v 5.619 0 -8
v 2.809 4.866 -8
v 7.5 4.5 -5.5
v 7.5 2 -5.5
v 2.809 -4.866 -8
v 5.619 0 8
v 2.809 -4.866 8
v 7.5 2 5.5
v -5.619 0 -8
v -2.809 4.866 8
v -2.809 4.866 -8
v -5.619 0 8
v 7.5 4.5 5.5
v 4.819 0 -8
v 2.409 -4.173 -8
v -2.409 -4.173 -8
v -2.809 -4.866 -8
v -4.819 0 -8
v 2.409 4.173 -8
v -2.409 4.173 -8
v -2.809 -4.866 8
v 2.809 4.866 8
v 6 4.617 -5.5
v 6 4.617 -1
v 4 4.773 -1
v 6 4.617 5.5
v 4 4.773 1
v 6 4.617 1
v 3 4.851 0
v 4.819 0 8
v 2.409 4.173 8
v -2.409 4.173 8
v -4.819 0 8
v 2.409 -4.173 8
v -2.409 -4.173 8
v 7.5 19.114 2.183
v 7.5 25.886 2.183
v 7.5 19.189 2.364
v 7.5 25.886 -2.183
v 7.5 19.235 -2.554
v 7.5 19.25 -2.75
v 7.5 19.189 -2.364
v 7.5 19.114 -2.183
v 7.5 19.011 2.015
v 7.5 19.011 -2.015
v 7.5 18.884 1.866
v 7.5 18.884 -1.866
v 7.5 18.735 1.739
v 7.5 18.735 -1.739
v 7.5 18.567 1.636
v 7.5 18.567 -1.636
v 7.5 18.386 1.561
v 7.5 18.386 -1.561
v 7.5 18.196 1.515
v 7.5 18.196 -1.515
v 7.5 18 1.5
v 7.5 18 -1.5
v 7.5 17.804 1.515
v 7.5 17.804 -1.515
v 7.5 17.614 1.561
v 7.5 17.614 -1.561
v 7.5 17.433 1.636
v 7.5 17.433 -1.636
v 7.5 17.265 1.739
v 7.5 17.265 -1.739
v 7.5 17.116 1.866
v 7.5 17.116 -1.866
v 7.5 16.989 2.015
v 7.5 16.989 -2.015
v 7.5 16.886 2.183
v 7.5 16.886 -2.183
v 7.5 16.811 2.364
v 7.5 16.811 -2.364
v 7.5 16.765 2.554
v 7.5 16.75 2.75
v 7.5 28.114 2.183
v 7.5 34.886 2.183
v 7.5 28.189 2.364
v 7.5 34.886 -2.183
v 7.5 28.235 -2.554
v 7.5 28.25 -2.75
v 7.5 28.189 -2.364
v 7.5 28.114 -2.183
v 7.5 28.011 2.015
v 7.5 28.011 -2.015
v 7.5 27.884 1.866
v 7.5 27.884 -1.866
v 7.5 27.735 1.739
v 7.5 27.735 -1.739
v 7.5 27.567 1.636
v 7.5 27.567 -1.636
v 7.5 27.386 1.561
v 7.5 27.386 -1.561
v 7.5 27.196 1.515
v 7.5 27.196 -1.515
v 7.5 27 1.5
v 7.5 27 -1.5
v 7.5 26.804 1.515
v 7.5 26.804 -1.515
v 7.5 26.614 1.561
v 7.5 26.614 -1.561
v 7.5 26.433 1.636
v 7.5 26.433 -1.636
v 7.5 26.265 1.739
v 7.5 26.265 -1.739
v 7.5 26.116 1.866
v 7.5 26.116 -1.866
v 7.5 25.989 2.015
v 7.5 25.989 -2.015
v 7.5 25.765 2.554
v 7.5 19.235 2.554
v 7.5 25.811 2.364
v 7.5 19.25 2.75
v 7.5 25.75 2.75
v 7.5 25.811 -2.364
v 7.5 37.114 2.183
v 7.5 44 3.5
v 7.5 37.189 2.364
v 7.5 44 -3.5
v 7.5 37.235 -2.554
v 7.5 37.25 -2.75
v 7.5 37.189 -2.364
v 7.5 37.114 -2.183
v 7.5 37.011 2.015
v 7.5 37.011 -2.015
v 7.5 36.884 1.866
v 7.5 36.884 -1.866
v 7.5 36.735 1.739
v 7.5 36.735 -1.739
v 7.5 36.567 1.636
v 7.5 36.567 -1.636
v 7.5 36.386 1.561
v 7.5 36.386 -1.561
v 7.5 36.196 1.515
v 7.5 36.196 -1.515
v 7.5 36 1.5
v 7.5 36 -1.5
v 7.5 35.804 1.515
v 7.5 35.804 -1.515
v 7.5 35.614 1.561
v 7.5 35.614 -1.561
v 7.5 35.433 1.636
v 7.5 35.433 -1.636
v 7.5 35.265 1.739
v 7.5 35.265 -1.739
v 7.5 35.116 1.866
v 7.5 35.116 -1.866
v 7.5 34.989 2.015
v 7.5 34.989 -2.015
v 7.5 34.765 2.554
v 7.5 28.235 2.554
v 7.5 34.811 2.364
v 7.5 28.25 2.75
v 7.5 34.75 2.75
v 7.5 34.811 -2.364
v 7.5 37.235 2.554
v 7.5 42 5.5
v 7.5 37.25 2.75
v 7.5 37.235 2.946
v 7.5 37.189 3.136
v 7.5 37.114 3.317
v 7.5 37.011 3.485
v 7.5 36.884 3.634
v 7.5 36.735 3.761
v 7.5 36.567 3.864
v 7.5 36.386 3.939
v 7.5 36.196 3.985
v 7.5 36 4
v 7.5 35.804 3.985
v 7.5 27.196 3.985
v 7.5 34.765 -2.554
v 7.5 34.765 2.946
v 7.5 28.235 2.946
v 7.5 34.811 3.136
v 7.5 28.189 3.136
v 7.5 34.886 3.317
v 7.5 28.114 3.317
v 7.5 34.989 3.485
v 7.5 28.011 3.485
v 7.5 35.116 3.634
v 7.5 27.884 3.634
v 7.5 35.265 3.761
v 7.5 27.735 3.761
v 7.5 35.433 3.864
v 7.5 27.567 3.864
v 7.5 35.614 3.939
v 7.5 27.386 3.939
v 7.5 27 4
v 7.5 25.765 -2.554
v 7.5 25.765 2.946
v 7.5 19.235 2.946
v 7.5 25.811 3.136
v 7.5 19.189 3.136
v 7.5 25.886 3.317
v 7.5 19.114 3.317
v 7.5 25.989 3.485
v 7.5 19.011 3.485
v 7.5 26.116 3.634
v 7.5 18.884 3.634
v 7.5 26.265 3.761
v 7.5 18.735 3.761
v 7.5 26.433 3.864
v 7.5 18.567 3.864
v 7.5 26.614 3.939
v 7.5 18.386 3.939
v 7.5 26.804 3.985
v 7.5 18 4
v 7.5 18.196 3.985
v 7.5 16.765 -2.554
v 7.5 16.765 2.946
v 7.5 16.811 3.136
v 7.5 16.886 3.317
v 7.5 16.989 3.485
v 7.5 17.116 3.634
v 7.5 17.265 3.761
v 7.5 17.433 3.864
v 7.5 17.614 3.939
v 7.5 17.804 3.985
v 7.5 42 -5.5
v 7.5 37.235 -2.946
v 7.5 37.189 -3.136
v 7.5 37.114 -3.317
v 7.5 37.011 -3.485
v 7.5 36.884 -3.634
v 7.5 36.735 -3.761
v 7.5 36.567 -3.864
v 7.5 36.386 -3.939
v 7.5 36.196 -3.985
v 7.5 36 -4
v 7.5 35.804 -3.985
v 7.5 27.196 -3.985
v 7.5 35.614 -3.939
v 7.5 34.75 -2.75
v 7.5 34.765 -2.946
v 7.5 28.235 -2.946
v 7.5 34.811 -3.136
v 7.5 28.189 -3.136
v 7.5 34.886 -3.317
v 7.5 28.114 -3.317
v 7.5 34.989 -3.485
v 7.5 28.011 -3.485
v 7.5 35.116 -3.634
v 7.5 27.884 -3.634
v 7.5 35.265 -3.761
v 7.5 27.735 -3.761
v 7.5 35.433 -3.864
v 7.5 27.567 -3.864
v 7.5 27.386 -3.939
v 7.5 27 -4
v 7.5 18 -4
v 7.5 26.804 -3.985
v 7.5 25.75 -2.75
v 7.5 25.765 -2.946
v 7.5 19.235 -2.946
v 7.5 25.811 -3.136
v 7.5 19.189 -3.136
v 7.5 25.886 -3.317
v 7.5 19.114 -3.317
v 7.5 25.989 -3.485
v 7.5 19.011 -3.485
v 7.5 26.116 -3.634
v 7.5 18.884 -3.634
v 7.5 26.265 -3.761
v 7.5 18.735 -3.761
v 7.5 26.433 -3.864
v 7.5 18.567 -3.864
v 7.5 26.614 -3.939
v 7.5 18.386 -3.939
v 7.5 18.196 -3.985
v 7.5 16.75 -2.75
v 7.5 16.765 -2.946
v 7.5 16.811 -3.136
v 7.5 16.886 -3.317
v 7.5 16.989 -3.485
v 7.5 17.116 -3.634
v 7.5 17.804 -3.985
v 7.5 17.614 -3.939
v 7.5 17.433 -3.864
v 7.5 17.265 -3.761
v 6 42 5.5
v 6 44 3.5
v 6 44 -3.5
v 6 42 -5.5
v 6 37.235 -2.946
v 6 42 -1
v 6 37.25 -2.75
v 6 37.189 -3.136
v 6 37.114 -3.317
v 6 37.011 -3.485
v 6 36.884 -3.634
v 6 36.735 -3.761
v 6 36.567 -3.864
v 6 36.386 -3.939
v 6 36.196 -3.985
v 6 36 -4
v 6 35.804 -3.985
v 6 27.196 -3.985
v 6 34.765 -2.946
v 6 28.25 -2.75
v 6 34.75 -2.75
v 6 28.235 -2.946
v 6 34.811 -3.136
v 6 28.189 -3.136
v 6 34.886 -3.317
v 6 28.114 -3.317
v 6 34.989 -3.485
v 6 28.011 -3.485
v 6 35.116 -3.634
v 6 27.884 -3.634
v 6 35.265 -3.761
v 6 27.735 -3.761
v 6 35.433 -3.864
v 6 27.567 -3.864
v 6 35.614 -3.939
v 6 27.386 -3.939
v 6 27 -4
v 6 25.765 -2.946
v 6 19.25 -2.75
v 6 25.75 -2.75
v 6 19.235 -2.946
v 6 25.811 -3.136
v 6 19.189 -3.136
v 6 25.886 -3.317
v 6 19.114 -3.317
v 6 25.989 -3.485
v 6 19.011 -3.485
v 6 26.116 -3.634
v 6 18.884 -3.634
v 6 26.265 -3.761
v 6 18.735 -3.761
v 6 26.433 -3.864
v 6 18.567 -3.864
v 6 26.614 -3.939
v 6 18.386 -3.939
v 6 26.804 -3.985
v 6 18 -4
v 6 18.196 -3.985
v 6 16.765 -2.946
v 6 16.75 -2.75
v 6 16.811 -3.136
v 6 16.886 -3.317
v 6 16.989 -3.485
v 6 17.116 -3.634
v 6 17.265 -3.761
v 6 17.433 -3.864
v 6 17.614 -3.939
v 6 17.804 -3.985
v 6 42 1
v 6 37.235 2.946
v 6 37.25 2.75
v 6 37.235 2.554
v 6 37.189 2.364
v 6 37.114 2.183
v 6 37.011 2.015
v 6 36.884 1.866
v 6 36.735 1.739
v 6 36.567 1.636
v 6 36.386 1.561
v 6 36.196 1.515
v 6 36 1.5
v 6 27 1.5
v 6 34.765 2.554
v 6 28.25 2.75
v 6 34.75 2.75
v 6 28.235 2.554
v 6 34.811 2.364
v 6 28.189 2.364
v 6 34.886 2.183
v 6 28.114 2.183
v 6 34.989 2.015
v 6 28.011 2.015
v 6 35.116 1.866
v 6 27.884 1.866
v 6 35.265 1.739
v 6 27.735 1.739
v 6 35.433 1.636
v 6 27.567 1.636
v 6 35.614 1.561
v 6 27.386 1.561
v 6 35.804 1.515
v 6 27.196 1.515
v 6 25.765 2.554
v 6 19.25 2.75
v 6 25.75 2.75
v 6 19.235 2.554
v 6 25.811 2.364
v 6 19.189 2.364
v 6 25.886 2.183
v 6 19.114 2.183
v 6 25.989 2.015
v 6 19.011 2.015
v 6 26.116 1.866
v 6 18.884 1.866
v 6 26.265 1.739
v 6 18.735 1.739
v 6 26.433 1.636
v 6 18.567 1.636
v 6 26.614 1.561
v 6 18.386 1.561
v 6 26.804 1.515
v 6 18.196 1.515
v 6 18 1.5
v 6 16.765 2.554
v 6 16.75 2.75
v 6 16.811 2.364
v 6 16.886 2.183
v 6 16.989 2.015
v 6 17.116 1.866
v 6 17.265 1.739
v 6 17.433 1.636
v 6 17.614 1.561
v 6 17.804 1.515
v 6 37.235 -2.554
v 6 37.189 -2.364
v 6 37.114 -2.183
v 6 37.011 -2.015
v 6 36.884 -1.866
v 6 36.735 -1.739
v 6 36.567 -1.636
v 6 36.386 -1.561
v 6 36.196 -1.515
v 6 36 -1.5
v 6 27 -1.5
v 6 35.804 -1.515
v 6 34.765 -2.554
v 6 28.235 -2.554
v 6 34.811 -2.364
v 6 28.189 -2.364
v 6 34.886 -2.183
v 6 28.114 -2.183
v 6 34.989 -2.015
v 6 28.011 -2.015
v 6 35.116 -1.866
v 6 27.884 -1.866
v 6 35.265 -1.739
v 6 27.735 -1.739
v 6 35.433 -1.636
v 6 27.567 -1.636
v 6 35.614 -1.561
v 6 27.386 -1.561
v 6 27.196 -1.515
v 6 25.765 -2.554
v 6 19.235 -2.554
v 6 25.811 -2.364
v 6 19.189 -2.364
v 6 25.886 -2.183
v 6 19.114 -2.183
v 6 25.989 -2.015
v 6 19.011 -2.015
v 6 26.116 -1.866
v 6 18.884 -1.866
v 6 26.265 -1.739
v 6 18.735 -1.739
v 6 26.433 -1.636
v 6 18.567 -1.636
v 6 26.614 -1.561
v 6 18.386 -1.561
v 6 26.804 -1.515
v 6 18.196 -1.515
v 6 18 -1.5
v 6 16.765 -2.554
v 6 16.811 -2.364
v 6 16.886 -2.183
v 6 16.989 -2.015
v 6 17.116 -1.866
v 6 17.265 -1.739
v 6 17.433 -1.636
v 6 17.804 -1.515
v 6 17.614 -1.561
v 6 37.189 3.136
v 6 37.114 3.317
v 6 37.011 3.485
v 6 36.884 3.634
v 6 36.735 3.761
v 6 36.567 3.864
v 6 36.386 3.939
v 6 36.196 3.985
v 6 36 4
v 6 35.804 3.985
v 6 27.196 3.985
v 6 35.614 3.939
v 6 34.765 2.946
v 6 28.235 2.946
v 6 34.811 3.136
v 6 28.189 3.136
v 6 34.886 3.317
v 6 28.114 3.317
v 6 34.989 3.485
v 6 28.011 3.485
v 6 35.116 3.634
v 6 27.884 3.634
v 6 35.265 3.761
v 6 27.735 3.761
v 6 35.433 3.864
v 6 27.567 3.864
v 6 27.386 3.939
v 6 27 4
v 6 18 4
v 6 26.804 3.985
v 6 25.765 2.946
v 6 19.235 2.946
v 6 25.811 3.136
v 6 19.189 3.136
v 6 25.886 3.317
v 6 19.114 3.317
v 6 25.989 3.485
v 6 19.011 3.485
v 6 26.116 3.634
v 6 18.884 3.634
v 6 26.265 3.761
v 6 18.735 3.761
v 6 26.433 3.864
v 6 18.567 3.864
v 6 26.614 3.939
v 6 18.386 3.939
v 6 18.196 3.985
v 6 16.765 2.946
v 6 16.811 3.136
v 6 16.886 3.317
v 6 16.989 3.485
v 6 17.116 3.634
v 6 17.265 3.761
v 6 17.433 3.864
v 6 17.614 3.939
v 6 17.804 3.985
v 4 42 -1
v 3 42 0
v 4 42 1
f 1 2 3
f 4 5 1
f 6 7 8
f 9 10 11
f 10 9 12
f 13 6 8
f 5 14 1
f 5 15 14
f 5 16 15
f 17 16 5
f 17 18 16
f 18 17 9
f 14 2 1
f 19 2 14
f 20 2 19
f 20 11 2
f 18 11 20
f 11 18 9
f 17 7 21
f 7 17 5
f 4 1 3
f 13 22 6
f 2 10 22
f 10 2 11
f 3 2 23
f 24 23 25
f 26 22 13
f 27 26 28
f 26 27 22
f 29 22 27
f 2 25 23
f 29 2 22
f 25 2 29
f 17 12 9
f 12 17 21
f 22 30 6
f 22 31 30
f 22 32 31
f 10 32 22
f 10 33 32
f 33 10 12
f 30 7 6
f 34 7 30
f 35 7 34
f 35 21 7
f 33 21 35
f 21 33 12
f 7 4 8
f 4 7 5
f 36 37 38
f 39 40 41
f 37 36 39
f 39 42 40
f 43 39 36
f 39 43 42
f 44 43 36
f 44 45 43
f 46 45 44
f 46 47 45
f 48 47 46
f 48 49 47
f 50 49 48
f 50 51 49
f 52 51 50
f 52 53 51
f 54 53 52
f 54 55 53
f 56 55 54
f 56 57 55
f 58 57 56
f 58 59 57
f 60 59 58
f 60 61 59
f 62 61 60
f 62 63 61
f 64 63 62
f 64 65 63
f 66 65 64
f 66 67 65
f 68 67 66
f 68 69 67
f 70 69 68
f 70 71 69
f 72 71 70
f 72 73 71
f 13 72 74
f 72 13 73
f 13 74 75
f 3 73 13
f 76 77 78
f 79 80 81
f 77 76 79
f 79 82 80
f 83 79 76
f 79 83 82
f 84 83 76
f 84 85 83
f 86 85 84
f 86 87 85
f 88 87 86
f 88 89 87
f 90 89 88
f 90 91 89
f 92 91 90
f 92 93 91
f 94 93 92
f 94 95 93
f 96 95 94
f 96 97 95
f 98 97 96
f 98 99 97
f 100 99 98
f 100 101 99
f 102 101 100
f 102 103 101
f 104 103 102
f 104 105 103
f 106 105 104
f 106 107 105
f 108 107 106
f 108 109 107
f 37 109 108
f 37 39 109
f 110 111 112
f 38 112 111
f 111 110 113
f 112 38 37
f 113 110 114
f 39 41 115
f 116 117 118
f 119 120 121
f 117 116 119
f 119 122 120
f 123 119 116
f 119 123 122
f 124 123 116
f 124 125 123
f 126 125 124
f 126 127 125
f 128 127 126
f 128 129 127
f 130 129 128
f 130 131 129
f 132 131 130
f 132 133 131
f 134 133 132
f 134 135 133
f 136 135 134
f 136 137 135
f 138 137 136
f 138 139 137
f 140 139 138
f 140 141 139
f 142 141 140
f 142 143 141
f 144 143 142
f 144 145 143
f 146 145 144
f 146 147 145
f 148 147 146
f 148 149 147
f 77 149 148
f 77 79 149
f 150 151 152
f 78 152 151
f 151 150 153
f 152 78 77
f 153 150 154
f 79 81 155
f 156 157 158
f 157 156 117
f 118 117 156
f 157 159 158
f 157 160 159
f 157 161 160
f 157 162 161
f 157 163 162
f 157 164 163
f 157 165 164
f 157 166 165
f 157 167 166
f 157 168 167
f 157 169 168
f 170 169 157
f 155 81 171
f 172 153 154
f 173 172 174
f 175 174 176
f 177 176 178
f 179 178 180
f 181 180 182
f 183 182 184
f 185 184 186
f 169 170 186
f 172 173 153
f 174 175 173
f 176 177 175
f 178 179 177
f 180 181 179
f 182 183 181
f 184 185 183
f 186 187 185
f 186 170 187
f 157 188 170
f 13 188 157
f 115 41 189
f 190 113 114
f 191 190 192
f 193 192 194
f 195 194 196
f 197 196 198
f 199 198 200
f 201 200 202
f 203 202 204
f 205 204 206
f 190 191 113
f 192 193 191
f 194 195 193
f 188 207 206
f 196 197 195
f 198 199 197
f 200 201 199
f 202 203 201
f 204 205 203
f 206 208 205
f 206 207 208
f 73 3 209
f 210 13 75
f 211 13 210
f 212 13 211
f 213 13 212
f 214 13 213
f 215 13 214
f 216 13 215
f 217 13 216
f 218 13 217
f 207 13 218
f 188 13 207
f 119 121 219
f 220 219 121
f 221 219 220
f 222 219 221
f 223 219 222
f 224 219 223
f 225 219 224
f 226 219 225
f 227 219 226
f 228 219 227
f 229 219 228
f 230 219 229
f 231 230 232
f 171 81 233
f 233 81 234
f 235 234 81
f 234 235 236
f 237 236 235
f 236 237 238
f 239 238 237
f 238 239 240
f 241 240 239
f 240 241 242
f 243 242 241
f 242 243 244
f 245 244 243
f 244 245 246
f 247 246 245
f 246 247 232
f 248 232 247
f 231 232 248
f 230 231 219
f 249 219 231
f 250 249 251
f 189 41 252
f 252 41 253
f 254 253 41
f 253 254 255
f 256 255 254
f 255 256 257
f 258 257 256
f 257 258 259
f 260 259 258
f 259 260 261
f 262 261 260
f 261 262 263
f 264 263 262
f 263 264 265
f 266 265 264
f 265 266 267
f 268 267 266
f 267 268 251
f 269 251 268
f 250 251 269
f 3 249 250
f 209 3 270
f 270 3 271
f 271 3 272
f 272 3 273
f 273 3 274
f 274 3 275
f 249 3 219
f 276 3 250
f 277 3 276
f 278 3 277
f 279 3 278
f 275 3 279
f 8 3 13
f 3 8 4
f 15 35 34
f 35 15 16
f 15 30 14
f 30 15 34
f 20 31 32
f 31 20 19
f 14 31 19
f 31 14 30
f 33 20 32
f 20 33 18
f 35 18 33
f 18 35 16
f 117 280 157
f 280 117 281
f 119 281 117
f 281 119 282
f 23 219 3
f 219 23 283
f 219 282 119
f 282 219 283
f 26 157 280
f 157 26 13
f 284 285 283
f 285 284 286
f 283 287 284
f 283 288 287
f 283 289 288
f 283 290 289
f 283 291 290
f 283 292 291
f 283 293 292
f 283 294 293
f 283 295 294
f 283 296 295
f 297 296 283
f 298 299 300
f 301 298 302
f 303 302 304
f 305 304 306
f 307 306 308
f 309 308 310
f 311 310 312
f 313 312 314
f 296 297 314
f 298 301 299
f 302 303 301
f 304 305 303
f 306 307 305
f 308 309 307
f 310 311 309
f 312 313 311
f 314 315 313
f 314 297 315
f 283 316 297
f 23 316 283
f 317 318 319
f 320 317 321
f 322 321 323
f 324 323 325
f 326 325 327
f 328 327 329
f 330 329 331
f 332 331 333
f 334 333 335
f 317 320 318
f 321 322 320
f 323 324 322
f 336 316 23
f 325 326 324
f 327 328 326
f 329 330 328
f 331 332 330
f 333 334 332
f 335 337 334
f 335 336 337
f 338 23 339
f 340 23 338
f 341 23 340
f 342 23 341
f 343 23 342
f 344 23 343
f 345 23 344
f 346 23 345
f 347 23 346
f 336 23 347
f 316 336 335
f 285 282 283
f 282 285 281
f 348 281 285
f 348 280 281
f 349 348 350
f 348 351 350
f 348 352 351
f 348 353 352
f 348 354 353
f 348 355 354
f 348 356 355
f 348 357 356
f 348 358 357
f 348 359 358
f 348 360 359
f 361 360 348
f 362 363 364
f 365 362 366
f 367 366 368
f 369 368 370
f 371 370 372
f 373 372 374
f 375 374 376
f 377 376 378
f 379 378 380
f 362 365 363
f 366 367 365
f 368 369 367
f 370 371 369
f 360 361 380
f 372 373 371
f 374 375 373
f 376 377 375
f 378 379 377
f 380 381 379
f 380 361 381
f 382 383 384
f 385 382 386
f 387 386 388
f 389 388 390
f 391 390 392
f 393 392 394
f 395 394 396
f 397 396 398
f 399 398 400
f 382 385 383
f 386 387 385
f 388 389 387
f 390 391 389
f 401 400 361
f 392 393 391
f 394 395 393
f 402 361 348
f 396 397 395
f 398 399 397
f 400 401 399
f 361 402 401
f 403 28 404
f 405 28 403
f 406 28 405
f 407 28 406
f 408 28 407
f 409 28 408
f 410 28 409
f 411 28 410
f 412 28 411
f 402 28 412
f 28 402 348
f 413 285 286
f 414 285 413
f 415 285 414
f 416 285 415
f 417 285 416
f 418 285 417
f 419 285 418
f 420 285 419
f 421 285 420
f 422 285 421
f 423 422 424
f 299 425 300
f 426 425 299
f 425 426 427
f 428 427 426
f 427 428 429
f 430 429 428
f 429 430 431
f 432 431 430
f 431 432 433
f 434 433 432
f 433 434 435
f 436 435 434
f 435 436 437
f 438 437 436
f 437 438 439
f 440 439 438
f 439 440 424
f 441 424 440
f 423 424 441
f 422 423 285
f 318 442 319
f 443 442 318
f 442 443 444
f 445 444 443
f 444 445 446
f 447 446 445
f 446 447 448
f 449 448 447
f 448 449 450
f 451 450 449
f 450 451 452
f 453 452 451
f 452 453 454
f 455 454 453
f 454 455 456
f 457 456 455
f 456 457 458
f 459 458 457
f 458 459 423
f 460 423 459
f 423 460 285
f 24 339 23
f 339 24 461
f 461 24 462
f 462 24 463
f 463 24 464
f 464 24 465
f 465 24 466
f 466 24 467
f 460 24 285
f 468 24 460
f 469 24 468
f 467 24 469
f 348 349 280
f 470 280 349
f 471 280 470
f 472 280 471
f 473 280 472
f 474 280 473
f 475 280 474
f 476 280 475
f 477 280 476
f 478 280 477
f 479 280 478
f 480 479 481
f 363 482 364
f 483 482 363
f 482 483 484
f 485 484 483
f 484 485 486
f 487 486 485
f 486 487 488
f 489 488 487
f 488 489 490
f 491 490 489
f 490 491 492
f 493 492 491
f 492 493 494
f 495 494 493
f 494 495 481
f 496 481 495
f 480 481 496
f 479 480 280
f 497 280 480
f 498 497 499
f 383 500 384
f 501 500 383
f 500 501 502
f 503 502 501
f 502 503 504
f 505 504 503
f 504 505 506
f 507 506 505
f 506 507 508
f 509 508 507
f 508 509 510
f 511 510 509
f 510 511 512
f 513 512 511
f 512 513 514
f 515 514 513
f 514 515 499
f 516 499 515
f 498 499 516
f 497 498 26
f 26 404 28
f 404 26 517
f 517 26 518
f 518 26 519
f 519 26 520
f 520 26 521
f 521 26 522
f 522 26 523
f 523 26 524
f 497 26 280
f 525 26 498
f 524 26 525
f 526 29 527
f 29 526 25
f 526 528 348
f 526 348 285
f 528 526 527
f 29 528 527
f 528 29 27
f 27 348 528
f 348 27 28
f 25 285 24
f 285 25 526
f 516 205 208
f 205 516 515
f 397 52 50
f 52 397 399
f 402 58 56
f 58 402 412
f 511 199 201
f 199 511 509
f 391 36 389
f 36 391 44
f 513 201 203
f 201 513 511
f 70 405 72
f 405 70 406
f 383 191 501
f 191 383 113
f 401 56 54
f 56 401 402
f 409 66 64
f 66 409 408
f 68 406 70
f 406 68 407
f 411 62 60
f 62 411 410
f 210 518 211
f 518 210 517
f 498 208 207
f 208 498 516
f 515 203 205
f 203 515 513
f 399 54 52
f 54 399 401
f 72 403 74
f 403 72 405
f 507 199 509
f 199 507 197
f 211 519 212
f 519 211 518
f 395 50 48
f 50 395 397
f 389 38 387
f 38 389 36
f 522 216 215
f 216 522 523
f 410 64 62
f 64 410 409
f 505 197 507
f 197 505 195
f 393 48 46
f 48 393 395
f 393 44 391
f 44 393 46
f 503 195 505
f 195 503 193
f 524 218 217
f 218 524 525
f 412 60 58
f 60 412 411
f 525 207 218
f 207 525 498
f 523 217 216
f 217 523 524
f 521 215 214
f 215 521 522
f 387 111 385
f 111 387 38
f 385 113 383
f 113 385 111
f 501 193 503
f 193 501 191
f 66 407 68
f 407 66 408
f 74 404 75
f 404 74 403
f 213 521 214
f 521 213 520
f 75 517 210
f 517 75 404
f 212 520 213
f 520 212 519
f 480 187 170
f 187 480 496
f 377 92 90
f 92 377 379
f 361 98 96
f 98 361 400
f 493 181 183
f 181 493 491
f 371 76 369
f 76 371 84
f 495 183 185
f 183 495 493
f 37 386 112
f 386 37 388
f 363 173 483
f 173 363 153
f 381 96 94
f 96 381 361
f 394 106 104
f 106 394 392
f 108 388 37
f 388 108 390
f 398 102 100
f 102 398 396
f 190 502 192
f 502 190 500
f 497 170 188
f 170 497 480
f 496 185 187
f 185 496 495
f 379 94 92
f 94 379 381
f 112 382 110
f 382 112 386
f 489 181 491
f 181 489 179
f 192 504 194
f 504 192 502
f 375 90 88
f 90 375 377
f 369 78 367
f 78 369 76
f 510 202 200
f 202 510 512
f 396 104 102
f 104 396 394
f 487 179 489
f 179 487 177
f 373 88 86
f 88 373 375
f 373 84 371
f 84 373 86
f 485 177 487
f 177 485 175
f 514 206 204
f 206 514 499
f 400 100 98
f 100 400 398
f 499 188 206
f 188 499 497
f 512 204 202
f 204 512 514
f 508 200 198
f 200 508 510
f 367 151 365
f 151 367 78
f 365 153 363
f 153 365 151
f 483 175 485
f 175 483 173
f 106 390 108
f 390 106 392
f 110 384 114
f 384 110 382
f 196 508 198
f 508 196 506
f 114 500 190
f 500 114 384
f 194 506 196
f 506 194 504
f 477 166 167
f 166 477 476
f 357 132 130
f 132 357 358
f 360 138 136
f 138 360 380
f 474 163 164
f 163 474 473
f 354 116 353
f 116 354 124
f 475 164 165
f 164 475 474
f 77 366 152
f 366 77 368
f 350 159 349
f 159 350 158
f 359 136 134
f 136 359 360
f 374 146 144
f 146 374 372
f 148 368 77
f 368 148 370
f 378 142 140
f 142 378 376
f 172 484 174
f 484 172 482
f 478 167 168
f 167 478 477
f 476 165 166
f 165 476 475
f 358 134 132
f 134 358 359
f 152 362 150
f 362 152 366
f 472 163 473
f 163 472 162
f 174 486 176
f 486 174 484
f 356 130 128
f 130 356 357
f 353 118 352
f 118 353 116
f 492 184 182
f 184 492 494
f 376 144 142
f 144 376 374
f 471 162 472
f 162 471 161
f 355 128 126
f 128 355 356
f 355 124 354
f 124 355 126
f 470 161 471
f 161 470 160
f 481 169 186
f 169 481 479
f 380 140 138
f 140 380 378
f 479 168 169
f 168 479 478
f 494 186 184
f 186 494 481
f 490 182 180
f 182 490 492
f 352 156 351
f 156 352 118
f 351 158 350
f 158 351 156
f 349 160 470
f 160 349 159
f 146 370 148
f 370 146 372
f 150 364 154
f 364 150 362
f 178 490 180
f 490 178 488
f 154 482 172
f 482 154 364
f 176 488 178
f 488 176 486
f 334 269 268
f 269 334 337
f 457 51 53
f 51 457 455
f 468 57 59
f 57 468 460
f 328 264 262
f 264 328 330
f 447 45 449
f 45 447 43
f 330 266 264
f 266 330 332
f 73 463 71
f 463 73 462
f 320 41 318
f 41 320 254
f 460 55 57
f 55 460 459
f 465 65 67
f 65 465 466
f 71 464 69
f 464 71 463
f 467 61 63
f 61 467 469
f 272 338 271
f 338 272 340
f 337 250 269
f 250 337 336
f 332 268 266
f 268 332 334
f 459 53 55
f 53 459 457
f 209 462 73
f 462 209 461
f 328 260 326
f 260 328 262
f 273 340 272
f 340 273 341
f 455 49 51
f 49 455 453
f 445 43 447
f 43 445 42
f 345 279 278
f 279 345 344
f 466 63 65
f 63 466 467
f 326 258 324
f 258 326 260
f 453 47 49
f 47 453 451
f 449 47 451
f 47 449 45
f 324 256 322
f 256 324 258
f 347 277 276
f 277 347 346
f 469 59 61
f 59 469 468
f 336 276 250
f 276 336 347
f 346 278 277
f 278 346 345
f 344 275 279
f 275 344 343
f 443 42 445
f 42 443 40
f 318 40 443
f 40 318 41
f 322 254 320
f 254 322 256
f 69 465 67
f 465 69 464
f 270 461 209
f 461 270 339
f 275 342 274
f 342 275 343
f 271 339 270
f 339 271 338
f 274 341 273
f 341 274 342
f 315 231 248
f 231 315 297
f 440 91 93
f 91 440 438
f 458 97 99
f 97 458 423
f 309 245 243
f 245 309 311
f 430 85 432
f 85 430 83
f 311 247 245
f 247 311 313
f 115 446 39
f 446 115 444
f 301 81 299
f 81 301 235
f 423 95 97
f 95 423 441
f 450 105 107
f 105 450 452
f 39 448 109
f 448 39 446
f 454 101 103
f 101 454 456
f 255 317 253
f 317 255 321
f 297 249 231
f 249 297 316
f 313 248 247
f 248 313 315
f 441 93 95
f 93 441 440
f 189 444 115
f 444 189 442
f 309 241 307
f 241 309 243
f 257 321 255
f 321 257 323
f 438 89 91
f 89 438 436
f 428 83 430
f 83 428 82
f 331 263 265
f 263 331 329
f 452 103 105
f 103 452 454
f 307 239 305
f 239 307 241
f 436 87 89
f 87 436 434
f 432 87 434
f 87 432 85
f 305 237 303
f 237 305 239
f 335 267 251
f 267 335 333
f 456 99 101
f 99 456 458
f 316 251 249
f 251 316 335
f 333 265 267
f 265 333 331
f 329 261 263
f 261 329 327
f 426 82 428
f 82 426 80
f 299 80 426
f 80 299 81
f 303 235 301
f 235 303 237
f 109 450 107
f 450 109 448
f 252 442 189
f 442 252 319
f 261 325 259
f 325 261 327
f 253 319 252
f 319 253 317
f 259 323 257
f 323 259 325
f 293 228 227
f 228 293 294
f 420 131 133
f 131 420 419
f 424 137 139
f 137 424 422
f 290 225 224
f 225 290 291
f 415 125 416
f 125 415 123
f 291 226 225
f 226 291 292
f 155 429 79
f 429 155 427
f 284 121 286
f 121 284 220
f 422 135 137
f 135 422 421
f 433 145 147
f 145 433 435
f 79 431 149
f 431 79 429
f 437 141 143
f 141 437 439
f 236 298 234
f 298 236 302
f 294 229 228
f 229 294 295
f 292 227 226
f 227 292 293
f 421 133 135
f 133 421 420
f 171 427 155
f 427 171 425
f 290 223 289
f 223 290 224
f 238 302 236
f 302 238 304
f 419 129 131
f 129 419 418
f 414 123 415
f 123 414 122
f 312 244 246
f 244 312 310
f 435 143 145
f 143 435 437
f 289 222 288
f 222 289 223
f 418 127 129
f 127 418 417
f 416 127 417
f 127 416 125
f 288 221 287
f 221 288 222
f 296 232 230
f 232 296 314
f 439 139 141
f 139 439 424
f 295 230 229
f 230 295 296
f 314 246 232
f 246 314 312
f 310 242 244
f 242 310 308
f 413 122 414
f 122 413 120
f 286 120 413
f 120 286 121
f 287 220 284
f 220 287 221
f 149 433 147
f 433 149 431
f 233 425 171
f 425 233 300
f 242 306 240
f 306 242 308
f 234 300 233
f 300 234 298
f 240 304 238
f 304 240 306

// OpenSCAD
// file: n20.scad
/*
 * N20 gear motor
 */

$fs = 0.4; // millimetres; smallest segment

motor_w = 16; // Width of motor (x axis)
motor_h = 10; // motor height
motor_d = 12; // y
gearbox_h = 10.6;
gearbox_d = 12;
gearbox_w = 10;
 
module n20_motor(margin=0.2)
{
    motor_d_half = motor_d / 2;
    motor_w_half = motor_w / 2;
    gearbox_w_half = gearbox_w / 2;
    // Oval motor body
    curve_rad = 10;
    translate([-motor_w_half - gearbox_w,0,0])
    rotate([0,90,0]) {
        $fa = 5.0; // more polygons?
        linear_extrude(motor_w, center=true) {
            intersection() {
            
                translate([0, motor_d_half - curve_rad - margin])
                    circle(r=curve_rad);
                translate([0, -motor_d_half + curve_rad + margin])
                    circle(r=curve_rad);
                square([motor_h,motor_d + (margin*2)], center=true);
            }
        }
    }
    // Cube gearbox
    translate([- gearbox_w_half, 0,0]) {
        cube([ gearbox_w + 0.1 + (margin*2), gearbox_d, gearbox_h], center=true); 
    }
    // Shaft
    translate([0,0,0]) {
        rotate([0,90,0]) {
            cylinder(h=10, r=1.5);
        }
    }
}

module n20_motor_top_ext(back_part=6.0) {
    // Motor with a box on top
    // And a cylinder out the back.
    n20_motor();
    translate([-motor_w-gearbox_w, -(motor_d/2), motor_h/2 - 0.2])
        cube([motor_w+gearbox_w, gearbox_d, gearbox_h]);
        
    // This is a cutout for wiring, terminals etc
    back_x = -motor_w-gearbox_w - back_part;
    translate([back_x, -(motor_d/2) + 1, -motor_h/2 + 2]) {
        cube([back_part + 0.2, motor_d - 2, motor_h + 0.2]);
    }
}

n20_motor();
// file: inc/utils.scad
// 2d polyline, circles connected by segments.
// Points is an array of arrays with a minimum of 2 elements.
module polyline(points, radius)
{
    polyline_hulls(points) {
        circle(radius);
    }
}

// Do a polyline, by making hulls between each pair of points
// and duplicating children() at those points...
module polyline_hulls(points) {
    for (i=[0:len(points)-2]) {
        p1 = points[i];
        p2 = points[i+1];
        hull() {
            translate(p1) children();
            translate(p2) children();
        }
    }    
}

module mirror_x()
{
    union() {
        children();
        mirror([1,0,0]) children();
    }
}

module mirror_y()
{
    union() {
        children();
        mirror([0,1,0]) children();
    }
}

module mirror_z()
{
    union() {
        children();
        mirror([0,0,1]) children();
    }
}

// Draw origin-centred, unit polyhedron.
module octahedron(C0=1.0) {
    polyhedron(points = [
        [0.0, 0.0,  C0],
        [0.0, 0.0, -C0],
        [ C0, 0.0, 0.0],
        [-C0, 0.0, 0.0],
        [0.0,  C0, 0.0],
        [0.0, -C0, 0.0]
        ],
        faces = [
[ 4 , 2, 0],
[ 3 , 4, 0],
[ 5 , 3, 0],
[ 2 , 5, 0],
[ 5 , 2, 1],
[ 3 , 5, 1],
[ 4 , 3, 1],
[ 2 , 4, 1]
        ]
    );
}

module diamond(C0=1.0) {
    rotate([0,0,45])
        square([C0 * sqrt(2), C0 * sqrt(2)], center=true);
}

// Rounded rectangle, centred.
module rounded_rect(w,h,r)
{
    hull() {
        translate([(-w / 2) + r, (-h / 2) + r])
            circle(r);
        translate([(w / 2) - r, (-h / 2) + r])
            circle(r);
        translate([(-w / 2) + r, (h / 2) - r])
            circle(r);
        translate([(w / 2) - r, (h / 2) - r])
            circle(r);
    }
}
// file: inc/bevel_lib.scad
// Bevelled boxes, etc
module roundedbox(size=[1.0, 1.0, 1.0, ], radius = 0.1) {
    hull() {
        for (x = [radius, size[0] - radius]) {
            for (y = [radius, size[1] - radius]) {
                for (z = [radius, size[2] - radius]) {
                    translate([x,y,z])
                        sphere(r=radius);
                }
            }
        }
    }
}

module rounded_square_centered(size=[1,1], radius=0.1) {
    hull() {
        for (x = [- size[0] / 2 + radius, size[0] / 2 - radius]) {
            for (y = [- size[1] / 2 + radius, size[1] / 2 - radius]) {
                translate([x,y]) circle(radius);
            }
        }
    }
}

module bevelled_square(size=[1,1], radius=0.1) {
    polygon(points=[
            // Left
            [0, radius ],
            [0, size[1] - radius ],
            // Top
            [radius, size[1]],
            [size[0] - radius, size[1]],
            // Right
            [size[0], size[1] - radius],
            [size[0], radius],
            // Bot
            [size[0] -radius, 0],
            [radius, 0]
        ]);
}

// Bevelled in x and y axes.
module bevelledbox(size=[1,1,1], radius=0.1) {
    linear_extrude(height=size[2]) {
        // 8-sided polygon
        polygon(points=[
            // Left
            [0, radius ],
            [0, size[1] - radius ],
            // Top
            [radius, size[1]],
            [size[0] - radius, size[1]],
            // Right
            [size[0], size[1] - radius],
            [size[0], radius],
            // Bot
            [size[0] -radius, 0],
            [radius, 0]
            ]);
    }
}

module bevelledbox_y(size=[1,1,1], radius=0.1) {
    // Bevelled around y
    translate([0,0,size[2]])
        rotate(-90, [1,0,0])
            bevelledbox([size[0], size[2], size[1]], radius); 
}

module bevelledbox_x(size=[1,1,1], radius=0.1) {
    // Bevelled around x
    translate([size[0],0,0])
        rotate(-90, [0,1,0])
            bevelledbox([size[2], size[1], size[0]], radius); 
}

// Draw origin-centred, unit polyhedron.
module octahedron(C0=1.0) {
    polyhedron(points = [
        [0.0, 0.0,  C0],
        [0.0, 0.0, -C0],
        [ C0, 0.0, 0.0],
        [-C0, 0.0, 0.0],
        [0.0,  C0, 0.0],
        [0.0, -C0, 0.0]
        ],
        faces = [
[ 4 , 2, 0],
[ 3 , 4, 0],
[ 5 , 3, 0],
[ 2 , 5, 0],
[ 5 , 2, 1],
[ 3 , 5, 1],
[ 4 , 3, 1],
[ 2 , 4, 1]
        ]
    );
}

module fullybevelledbox(size=[1,1,1], radius=0.1) {
    hull() {
        for (x = [radius, size[0] - radius]) {
            for (y = [radius, size[1] - radius]) {
                for (z = [radius, size[2] - radius]) {
                    translate([x,y,z])
                        octahedron(radius);
                }
            }
        }
    }
}
// file: shell.scad
use <n20.scad>;
use <inc/utils.scad>;
use <inc/bevel_lib.scad>;

$fs = 0.6; // millimetres

shell_w = 80;
shell_d = 80;
shell_h = 15;

drive_motor_y = 23;
flip_motor_y = -31;

front_slope = 12;
rear_slope = 0; // Set this to slope the rear backwards

shell_d_half = shell_d / 2;
shell_w_half = shell_w / 2;

module mirror_xy() {
    mirror_x() {
        mirror_y() {
            children();
        }
    }
}

module side_outline() {
    // Make the quad for the main shape
    // 2d, centred on the x axis
    polygon(
        [
            [-shell_d_half, 0],
            [-shell_d_half - rear_slope, shell_h],
            [shell_d_half - front_slope, shell_h],
            [shell_d_half, 0]
        ]
        );
}

module motor_cutouts() {
    shell_w_half = shell_w/2;
    mirror_x() {
        // Drive motors
        translate([shell_w_half,drive_motor_y,shell_h/2]) {
            n20_motor_top_ext();
        }
        // Flip motors - these point inwards.
        translate([-10,flip_motor_y,shell_h/2]) {
            n20_motor_top_ext(back_part=3.0);        
        }
    }
}

module lid_cutout() {
    translate( [0,0,(shell_h * 1.5) - 2]) {
        cube([shell_w - 4, shell_d - 4, shell_h], center=true);
    }
}

module other_cutouts() {
    // Cutouts: Battery / gubbins compartment
    // fullybevelledbox is not centred.
    mirror_x() {
        translate([2, -24, 1 + 0.4])
            fullybevelledbox([30,39, shell_h -3], radius=1.0);
    }
    // Wiring cutouts
    // Lengthwise cutout
    translate([-1.25,-shell_d_half + 3, 9])
        fullybevelledbox([2.5, shell_d - 10, shell_h], radius=1.0);
    // Cutout for the flipper axle etc
    translate([-11, flip_motor_y - 2.5, shell_h - 10])
        fullybevelledbox([22, 5, shell_h], radius=1.0);
    // Cutout for the flipper axle bits
    translate([-6, flip_motor_y - 6, 2])
        fullybevelledbox([12, 12, shell_h], radius=1.0);
    // Cut out the rear
    translate([0, -shell_d_half, shell_h])
        cube([22,5,4], center=true);
}

screw_locations = [
    [5, shell_d_half - 15], 
    [shell_w_half - 5, -shell_d_half + 24],
    [shell_w_half - 5, -shell_d_half + 42],
    [8, -shell_d_half + 2.5]
];

module screw_holes() {
    // We could use M2 bolts, self tappers or something else.
    r=1.2;
    mirror_x() {
        for (location = screw_locations) {
            translate(location)
                cylinder(r=r, h=shell_h +25);
        }
    }
}

module main()
{
    difference() {
        rotate([0,0,90])
        rotate([90,0,0])
            linear_extrude(height=shell_w, center=true) {
                side_outline();
            }
        motor_cutouts();
        lid_cutout();
        other_cutouts();
        screw_holes();
    }
}

main();
// main file
use <shell.scad>;
use <inc/bevel_lib.scad>;
use <inc/utils.scad>;

$fs = 0.2; // millimetres
$fa = 4; // degrees

main_height = 11.0; // Centre part
total_height = 16.0; 
RADIUS = 4.0;
side_radius = 2.75;
bracketlen = 36;

centre_hex_tolerance = 0.2; // Amount of extra offset for centre hex. 

module flip_coupler_centre()
{
    // Across flats 8.0
    af = 8.0;
    r1 = (af / 2 / cos(30));
    thick = 1.5;
    panel_offset = 2.0; // Extra distance for panel
    // Centre part
    difference() {
        // Outer
         hull() {
            cylinder(r=r1 + 0.8 + centre_hex_tolerance, h=total_height, $fn=6, center=true);
            translate([RADIUS + panel_offset, 2, - (main_height / 2)])
            cube([thick, 2.5, main_height]);            
        }
         // Cutout for the alu shaft adapter
         cylinder(r=r1 + centre_hex_tolerance, h=30.0, $fn=6, center=true);
       }
}

module outside() {
    thick = 1.5;
    panel_offset = 2.0; // Extra distance for panel
    union() {
        flip_coupler_centre();

        // Panel
        translate([RADIUS + panel_offset, -RADIUS/2 + 4.0, - (main_height / 2)])
            bevelledbox_x([thick, RADIUS*1.5 + bracketlen, main_height], radius=2.0);
        // Panel: centre bracing beam
        
        translate([RADIUS-1.0, RADIUS, -1.0])
            bevelledbox_y([4,bracketlen+2, 2],radius=1.0);
    }
}

module holes() {
    // holes in the x direction through the bracket.
    hole_radius = 1.25;
    module hole1() {
        rotate([0,90,0])
            cylinder(r=hole_radius, h=30, center=true);
    }
    bl_quarter = bracketlen / 4;
    y_list = [bl_quarter*2, bl_quarter*3,
        bl_quarter*4];
    
    z = main_height / 4;
    mirror_z() {
        for (y = y_list) {
            translate([0, y, z])
                hole1();
        }
    }
}

module flip_coupler() {
    difference() {
        outside();
        holes();
    }
}

module hexshaft() {
    // Across flats 8.0
    af = 8.0;
    r = (af / 2 / cos(30));
    rotate([0,0,30]) cylinder(r=r, h=20.0, $fn=6, center=true);
}

flip_coupler();
// %hexshaft();
